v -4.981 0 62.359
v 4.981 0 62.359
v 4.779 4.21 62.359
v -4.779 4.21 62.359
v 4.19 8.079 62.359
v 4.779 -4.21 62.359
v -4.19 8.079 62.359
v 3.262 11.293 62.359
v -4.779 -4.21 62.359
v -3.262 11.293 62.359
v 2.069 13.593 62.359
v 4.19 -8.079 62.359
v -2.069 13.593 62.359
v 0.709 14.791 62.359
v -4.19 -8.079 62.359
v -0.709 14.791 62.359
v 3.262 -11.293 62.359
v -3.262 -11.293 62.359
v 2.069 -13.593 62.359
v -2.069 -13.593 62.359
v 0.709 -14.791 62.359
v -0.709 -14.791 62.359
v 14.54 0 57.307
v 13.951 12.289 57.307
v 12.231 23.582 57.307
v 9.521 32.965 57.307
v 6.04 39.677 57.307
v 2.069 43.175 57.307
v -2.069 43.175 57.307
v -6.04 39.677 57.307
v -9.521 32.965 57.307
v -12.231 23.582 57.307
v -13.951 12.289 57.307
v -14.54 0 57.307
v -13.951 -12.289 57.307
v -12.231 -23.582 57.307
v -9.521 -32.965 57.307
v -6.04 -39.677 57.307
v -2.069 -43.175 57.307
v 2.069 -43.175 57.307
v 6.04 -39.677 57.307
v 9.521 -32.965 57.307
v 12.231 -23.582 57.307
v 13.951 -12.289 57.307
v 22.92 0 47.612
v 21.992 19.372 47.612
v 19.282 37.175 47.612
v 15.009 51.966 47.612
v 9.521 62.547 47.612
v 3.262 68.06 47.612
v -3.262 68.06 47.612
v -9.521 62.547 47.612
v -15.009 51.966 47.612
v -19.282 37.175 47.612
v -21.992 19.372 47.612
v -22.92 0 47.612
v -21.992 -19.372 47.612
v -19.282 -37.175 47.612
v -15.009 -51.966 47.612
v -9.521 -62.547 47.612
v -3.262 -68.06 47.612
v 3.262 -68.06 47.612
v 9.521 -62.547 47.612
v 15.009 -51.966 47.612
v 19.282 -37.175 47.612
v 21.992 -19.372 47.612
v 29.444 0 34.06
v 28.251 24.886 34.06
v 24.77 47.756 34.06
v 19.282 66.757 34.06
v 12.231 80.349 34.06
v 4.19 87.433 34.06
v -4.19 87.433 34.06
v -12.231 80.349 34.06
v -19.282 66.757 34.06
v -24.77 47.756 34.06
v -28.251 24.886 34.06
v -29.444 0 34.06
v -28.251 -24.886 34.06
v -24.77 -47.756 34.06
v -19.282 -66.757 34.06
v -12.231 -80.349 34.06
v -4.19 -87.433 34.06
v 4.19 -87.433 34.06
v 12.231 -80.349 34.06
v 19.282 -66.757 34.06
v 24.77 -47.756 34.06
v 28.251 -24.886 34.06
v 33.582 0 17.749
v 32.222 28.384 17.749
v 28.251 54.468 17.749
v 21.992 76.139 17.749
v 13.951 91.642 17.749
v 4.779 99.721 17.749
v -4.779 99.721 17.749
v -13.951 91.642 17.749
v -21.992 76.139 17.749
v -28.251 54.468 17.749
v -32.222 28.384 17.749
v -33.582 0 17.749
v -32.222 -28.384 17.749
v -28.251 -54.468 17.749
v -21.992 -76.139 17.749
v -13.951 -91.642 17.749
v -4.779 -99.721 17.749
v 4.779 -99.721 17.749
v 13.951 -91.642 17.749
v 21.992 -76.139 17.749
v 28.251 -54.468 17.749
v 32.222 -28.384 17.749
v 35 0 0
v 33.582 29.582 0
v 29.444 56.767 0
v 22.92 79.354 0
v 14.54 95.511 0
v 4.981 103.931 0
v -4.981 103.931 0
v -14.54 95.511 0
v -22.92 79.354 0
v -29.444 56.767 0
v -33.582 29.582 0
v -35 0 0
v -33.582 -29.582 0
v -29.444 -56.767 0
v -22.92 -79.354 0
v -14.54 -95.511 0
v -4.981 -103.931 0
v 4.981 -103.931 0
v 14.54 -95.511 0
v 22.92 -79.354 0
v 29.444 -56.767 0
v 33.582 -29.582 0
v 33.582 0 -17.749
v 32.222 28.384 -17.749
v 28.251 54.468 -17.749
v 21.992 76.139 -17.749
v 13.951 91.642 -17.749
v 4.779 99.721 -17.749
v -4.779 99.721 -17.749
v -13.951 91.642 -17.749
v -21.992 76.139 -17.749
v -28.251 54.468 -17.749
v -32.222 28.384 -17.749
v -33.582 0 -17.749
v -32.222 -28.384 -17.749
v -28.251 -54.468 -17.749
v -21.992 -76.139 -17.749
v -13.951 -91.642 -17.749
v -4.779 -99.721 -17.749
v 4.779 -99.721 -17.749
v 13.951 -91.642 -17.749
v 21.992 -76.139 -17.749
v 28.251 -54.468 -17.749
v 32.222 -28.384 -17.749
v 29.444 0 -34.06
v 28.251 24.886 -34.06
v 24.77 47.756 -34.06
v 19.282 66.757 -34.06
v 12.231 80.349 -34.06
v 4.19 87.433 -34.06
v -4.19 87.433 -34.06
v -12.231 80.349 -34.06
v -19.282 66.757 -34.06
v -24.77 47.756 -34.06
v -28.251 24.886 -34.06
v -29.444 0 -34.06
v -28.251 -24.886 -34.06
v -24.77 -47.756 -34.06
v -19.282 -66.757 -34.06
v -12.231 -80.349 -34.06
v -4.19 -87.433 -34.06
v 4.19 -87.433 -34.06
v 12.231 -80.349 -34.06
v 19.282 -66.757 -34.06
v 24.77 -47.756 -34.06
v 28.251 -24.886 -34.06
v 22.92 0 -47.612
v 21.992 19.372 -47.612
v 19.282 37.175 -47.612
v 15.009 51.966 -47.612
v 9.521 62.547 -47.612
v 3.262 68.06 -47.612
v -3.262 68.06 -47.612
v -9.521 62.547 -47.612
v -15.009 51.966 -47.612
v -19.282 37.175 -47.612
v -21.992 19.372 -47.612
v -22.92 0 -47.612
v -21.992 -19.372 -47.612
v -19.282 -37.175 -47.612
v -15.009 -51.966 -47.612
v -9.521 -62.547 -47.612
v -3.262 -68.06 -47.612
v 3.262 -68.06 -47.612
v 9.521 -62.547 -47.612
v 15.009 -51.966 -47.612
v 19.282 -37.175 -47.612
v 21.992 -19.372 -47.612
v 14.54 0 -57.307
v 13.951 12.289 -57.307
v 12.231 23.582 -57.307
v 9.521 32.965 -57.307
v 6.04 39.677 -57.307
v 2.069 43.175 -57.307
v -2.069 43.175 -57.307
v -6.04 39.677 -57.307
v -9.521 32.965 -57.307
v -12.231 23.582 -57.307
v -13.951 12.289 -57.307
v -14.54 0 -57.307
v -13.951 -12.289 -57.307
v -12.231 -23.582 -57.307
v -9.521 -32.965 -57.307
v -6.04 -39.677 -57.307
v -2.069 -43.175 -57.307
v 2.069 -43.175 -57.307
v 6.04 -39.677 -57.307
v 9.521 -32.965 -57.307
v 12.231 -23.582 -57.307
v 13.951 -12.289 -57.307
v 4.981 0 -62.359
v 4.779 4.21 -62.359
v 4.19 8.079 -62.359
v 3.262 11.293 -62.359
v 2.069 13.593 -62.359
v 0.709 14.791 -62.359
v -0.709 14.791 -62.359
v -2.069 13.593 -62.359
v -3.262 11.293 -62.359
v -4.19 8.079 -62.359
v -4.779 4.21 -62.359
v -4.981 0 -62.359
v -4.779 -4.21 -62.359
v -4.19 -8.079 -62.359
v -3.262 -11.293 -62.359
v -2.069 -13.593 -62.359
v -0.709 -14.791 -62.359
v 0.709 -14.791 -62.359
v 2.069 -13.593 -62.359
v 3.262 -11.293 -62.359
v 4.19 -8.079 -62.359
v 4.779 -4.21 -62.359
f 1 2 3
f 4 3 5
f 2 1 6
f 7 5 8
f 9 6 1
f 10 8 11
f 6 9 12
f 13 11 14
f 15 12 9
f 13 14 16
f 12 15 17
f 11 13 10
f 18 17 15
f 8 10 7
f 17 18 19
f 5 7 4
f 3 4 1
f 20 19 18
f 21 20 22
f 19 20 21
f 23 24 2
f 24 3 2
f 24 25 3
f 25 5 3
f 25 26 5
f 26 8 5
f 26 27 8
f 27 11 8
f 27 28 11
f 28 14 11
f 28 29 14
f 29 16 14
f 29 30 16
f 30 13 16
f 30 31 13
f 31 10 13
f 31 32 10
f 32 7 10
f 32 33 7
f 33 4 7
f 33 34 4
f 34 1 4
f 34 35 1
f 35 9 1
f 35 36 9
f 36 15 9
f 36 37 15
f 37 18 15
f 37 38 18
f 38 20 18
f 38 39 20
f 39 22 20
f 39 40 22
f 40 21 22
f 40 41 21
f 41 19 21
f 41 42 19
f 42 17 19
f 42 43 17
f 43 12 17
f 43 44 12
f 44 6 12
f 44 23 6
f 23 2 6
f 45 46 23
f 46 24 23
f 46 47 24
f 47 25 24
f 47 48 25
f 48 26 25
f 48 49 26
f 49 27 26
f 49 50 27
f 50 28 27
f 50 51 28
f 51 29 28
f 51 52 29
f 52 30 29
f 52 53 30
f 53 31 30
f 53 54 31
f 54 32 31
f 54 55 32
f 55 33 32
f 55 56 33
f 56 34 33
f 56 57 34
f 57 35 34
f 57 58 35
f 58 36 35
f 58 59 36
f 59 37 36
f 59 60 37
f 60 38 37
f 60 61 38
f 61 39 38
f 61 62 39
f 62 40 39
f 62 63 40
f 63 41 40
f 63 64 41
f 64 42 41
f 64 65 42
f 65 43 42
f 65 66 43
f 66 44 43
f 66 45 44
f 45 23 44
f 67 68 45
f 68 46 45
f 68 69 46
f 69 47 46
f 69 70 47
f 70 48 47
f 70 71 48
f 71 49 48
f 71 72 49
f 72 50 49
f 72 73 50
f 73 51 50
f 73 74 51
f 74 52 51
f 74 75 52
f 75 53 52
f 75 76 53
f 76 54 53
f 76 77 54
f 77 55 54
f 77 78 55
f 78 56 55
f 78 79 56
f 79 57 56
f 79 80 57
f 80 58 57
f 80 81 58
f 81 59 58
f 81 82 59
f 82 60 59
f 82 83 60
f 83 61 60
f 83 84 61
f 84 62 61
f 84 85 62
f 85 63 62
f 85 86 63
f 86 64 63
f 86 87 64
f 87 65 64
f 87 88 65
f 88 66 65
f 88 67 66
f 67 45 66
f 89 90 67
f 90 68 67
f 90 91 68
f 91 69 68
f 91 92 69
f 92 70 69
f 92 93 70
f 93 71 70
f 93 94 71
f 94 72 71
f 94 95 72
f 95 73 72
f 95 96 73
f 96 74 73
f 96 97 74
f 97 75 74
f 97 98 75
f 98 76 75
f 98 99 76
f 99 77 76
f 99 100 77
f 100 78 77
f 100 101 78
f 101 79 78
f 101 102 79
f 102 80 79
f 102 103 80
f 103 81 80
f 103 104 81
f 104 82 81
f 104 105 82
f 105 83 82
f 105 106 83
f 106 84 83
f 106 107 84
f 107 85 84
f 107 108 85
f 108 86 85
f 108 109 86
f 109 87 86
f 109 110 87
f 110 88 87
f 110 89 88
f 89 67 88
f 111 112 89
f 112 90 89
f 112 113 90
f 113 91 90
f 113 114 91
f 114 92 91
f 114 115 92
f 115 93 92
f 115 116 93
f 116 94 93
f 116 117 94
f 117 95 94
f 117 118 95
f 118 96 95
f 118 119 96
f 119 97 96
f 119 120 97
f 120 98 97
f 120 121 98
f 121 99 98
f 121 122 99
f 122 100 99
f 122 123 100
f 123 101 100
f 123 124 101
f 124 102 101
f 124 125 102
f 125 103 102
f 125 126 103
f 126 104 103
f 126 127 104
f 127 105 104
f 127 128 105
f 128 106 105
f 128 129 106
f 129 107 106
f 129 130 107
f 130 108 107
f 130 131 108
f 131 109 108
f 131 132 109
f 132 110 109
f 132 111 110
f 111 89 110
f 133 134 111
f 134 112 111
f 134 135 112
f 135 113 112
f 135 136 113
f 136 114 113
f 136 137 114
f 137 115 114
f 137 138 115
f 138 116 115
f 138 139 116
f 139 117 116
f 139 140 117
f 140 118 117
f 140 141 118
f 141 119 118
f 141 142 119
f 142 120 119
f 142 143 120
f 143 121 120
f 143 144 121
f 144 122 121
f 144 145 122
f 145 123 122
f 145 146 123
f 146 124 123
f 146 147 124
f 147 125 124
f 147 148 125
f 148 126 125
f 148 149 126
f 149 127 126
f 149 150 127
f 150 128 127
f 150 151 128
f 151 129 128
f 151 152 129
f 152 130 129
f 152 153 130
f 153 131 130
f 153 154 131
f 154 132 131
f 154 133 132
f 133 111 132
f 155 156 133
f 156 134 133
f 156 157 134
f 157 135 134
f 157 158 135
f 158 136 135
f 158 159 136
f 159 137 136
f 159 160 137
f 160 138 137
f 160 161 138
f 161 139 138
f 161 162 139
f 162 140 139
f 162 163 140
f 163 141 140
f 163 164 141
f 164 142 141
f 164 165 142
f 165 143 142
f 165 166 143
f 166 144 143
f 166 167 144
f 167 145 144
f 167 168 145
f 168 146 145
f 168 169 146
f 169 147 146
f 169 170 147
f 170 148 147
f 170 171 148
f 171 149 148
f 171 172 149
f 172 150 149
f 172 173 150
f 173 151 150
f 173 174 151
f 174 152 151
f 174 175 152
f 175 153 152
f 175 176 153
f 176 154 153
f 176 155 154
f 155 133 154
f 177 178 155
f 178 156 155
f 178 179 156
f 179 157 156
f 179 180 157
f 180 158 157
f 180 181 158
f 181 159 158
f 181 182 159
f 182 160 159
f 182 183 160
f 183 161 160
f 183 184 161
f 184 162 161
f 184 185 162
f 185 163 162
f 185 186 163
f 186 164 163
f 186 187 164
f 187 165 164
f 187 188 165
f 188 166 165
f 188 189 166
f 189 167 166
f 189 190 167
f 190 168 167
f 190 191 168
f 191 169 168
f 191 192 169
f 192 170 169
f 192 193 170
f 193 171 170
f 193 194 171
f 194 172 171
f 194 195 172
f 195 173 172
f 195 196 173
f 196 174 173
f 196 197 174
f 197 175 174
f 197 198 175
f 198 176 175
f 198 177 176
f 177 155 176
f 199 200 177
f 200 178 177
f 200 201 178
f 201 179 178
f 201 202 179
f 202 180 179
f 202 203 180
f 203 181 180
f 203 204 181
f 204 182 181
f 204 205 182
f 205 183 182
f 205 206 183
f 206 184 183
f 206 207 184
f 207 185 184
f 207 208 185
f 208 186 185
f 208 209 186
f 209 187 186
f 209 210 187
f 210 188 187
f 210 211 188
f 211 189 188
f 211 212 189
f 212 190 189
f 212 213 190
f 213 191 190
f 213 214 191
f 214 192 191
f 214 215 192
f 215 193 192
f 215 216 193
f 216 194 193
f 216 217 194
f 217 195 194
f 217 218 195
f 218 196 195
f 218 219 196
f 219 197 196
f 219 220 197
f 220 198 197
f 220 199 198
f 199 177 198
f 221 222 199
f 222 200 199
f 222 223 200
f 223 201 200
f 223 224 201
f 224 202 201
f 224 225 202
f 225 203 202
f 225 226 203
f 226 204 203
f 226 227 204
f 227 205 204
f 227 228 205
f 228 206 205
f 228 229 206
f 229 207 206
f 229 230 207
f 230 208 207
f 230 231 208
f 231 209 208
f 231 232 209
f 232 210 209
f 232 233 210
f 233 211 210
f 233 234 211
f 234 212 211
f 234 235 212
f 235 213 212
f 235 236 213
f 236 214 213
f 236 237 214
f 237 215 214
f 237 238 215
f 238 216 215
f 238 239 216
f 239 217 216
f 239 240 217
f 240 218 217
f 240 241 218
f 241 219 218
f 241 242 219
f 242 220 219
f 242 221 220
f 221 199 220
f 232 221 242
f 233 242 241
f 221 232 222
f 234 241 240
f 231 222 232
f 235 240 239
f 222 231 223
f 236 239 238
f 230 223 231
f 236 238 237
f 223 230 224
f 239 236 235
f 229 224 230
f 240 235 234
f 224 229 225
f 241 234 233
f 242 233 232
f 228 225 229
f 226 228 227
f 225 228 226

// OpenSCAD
// Generated by SolidPython 1.0.1 on 2020-07-29 00:46:46


scale(v = [5, 15, 9]) {
	sphere(r = 7);
}
/***********************************************
*********      SolidPython code:      **********
************************************************
 
# import packages: SolidPython
from solid import *
from solid.utils import *
from itertools import chain, combinations, permutations


class Resize:

    def __init__(self, scad_file):
        self.scad_file = scad_file
        #self.scad_file = import_scad(scad_file)
        # cone/cylinder param:
        self.r1 = 0
        self.r2 = 0
        self.h = 0
        # rectangular prism param:
        self.w = 0
        self.l = 0
        # ellipse param:
        self.r = 0

    # import OpenScad code (file name corresponds to shape)


    # classify shape + parameters
    def assign(self, param1, param2, param3):
        if self.scad_file == 'cone.scad':
            self.r1 = param1
            self.r2 = param2
            self.h = param3
        elif self.scad_file == 'cylinder.scad':
            self.r1 = param1
            self.r2 = param2
            self.h = param3
        elif self.scad_file == 'rectangularPrism.scad':
            self.h = param1
            self.l = param2
            self.w = param3
        else:
            self.r = param1
            self.h = param2

    # resize parameters
    def iterate(self):
        x = range(3, 20, 2)
        i = 1
        if self.scad_file == 'cone.scad':
            tempList = list(permutations(x, 2))
            for temp in tempList:
                param1 = temp[0]
                param2 = temp[1]
                filepath = 'produced_scad_files/' + 'cone' + str(param1) + '_' + str(param2) + '_' + '.scad'
                scad_render_to_file(cylinder(h=param1, r1=param2, r2=0), filepath)

        elif self.scad_file == 'cylinder.scad':
            tempList = list(permutations(x, 3))
            for temp in tempList:
                param1 = temp[0]
                param2 = temp[1]
                filepath = 'produced_scad_files/' + 'cylinder' + str(param1) + '_' + str(param2) + '_' + '.scad'
                scad_render_to_file(cylinder(h=param1, r1=param2, r2=param2), filepath)

        elif self.scad_file == 'rectangularPrism.scad':
            tempList = list(permutations(x, 3))
            for temp in tempList:
                param1 = temp[0]
                param2 = temp[1]
                param3 = temp[2]
                filepath = 'produced_scad_files/' + 'rectangularPrism' + str(param1) + '_' + str(param2) + '_' + str(
                    param3) + '.scad'
                scad_render_to_file(cube(size=(param1, param2, param3)), filepath)

        elif self.scad_file == 'ellipse.scad':
            tempList = list(permutations(x, 4))
            for temp in tempList:
                param1 = temp[0]
                param2 = temp[1]
                param3 = temp[2]
                param4 = temp[3]
                filepath = 'produced_scad_files/' + 'ellipse' + str(param1) + '_' + str(param2) + '_' + str(param3) + '_' + str(param4) + '.scad'
                scad_render_to_file(scale([param1, param2, param3])(sphere(r=param4)), filepath)

    def render_to_scadfile(self):
        scad_render_to_file(scad, 'example.scad') 
 
************************************************/
